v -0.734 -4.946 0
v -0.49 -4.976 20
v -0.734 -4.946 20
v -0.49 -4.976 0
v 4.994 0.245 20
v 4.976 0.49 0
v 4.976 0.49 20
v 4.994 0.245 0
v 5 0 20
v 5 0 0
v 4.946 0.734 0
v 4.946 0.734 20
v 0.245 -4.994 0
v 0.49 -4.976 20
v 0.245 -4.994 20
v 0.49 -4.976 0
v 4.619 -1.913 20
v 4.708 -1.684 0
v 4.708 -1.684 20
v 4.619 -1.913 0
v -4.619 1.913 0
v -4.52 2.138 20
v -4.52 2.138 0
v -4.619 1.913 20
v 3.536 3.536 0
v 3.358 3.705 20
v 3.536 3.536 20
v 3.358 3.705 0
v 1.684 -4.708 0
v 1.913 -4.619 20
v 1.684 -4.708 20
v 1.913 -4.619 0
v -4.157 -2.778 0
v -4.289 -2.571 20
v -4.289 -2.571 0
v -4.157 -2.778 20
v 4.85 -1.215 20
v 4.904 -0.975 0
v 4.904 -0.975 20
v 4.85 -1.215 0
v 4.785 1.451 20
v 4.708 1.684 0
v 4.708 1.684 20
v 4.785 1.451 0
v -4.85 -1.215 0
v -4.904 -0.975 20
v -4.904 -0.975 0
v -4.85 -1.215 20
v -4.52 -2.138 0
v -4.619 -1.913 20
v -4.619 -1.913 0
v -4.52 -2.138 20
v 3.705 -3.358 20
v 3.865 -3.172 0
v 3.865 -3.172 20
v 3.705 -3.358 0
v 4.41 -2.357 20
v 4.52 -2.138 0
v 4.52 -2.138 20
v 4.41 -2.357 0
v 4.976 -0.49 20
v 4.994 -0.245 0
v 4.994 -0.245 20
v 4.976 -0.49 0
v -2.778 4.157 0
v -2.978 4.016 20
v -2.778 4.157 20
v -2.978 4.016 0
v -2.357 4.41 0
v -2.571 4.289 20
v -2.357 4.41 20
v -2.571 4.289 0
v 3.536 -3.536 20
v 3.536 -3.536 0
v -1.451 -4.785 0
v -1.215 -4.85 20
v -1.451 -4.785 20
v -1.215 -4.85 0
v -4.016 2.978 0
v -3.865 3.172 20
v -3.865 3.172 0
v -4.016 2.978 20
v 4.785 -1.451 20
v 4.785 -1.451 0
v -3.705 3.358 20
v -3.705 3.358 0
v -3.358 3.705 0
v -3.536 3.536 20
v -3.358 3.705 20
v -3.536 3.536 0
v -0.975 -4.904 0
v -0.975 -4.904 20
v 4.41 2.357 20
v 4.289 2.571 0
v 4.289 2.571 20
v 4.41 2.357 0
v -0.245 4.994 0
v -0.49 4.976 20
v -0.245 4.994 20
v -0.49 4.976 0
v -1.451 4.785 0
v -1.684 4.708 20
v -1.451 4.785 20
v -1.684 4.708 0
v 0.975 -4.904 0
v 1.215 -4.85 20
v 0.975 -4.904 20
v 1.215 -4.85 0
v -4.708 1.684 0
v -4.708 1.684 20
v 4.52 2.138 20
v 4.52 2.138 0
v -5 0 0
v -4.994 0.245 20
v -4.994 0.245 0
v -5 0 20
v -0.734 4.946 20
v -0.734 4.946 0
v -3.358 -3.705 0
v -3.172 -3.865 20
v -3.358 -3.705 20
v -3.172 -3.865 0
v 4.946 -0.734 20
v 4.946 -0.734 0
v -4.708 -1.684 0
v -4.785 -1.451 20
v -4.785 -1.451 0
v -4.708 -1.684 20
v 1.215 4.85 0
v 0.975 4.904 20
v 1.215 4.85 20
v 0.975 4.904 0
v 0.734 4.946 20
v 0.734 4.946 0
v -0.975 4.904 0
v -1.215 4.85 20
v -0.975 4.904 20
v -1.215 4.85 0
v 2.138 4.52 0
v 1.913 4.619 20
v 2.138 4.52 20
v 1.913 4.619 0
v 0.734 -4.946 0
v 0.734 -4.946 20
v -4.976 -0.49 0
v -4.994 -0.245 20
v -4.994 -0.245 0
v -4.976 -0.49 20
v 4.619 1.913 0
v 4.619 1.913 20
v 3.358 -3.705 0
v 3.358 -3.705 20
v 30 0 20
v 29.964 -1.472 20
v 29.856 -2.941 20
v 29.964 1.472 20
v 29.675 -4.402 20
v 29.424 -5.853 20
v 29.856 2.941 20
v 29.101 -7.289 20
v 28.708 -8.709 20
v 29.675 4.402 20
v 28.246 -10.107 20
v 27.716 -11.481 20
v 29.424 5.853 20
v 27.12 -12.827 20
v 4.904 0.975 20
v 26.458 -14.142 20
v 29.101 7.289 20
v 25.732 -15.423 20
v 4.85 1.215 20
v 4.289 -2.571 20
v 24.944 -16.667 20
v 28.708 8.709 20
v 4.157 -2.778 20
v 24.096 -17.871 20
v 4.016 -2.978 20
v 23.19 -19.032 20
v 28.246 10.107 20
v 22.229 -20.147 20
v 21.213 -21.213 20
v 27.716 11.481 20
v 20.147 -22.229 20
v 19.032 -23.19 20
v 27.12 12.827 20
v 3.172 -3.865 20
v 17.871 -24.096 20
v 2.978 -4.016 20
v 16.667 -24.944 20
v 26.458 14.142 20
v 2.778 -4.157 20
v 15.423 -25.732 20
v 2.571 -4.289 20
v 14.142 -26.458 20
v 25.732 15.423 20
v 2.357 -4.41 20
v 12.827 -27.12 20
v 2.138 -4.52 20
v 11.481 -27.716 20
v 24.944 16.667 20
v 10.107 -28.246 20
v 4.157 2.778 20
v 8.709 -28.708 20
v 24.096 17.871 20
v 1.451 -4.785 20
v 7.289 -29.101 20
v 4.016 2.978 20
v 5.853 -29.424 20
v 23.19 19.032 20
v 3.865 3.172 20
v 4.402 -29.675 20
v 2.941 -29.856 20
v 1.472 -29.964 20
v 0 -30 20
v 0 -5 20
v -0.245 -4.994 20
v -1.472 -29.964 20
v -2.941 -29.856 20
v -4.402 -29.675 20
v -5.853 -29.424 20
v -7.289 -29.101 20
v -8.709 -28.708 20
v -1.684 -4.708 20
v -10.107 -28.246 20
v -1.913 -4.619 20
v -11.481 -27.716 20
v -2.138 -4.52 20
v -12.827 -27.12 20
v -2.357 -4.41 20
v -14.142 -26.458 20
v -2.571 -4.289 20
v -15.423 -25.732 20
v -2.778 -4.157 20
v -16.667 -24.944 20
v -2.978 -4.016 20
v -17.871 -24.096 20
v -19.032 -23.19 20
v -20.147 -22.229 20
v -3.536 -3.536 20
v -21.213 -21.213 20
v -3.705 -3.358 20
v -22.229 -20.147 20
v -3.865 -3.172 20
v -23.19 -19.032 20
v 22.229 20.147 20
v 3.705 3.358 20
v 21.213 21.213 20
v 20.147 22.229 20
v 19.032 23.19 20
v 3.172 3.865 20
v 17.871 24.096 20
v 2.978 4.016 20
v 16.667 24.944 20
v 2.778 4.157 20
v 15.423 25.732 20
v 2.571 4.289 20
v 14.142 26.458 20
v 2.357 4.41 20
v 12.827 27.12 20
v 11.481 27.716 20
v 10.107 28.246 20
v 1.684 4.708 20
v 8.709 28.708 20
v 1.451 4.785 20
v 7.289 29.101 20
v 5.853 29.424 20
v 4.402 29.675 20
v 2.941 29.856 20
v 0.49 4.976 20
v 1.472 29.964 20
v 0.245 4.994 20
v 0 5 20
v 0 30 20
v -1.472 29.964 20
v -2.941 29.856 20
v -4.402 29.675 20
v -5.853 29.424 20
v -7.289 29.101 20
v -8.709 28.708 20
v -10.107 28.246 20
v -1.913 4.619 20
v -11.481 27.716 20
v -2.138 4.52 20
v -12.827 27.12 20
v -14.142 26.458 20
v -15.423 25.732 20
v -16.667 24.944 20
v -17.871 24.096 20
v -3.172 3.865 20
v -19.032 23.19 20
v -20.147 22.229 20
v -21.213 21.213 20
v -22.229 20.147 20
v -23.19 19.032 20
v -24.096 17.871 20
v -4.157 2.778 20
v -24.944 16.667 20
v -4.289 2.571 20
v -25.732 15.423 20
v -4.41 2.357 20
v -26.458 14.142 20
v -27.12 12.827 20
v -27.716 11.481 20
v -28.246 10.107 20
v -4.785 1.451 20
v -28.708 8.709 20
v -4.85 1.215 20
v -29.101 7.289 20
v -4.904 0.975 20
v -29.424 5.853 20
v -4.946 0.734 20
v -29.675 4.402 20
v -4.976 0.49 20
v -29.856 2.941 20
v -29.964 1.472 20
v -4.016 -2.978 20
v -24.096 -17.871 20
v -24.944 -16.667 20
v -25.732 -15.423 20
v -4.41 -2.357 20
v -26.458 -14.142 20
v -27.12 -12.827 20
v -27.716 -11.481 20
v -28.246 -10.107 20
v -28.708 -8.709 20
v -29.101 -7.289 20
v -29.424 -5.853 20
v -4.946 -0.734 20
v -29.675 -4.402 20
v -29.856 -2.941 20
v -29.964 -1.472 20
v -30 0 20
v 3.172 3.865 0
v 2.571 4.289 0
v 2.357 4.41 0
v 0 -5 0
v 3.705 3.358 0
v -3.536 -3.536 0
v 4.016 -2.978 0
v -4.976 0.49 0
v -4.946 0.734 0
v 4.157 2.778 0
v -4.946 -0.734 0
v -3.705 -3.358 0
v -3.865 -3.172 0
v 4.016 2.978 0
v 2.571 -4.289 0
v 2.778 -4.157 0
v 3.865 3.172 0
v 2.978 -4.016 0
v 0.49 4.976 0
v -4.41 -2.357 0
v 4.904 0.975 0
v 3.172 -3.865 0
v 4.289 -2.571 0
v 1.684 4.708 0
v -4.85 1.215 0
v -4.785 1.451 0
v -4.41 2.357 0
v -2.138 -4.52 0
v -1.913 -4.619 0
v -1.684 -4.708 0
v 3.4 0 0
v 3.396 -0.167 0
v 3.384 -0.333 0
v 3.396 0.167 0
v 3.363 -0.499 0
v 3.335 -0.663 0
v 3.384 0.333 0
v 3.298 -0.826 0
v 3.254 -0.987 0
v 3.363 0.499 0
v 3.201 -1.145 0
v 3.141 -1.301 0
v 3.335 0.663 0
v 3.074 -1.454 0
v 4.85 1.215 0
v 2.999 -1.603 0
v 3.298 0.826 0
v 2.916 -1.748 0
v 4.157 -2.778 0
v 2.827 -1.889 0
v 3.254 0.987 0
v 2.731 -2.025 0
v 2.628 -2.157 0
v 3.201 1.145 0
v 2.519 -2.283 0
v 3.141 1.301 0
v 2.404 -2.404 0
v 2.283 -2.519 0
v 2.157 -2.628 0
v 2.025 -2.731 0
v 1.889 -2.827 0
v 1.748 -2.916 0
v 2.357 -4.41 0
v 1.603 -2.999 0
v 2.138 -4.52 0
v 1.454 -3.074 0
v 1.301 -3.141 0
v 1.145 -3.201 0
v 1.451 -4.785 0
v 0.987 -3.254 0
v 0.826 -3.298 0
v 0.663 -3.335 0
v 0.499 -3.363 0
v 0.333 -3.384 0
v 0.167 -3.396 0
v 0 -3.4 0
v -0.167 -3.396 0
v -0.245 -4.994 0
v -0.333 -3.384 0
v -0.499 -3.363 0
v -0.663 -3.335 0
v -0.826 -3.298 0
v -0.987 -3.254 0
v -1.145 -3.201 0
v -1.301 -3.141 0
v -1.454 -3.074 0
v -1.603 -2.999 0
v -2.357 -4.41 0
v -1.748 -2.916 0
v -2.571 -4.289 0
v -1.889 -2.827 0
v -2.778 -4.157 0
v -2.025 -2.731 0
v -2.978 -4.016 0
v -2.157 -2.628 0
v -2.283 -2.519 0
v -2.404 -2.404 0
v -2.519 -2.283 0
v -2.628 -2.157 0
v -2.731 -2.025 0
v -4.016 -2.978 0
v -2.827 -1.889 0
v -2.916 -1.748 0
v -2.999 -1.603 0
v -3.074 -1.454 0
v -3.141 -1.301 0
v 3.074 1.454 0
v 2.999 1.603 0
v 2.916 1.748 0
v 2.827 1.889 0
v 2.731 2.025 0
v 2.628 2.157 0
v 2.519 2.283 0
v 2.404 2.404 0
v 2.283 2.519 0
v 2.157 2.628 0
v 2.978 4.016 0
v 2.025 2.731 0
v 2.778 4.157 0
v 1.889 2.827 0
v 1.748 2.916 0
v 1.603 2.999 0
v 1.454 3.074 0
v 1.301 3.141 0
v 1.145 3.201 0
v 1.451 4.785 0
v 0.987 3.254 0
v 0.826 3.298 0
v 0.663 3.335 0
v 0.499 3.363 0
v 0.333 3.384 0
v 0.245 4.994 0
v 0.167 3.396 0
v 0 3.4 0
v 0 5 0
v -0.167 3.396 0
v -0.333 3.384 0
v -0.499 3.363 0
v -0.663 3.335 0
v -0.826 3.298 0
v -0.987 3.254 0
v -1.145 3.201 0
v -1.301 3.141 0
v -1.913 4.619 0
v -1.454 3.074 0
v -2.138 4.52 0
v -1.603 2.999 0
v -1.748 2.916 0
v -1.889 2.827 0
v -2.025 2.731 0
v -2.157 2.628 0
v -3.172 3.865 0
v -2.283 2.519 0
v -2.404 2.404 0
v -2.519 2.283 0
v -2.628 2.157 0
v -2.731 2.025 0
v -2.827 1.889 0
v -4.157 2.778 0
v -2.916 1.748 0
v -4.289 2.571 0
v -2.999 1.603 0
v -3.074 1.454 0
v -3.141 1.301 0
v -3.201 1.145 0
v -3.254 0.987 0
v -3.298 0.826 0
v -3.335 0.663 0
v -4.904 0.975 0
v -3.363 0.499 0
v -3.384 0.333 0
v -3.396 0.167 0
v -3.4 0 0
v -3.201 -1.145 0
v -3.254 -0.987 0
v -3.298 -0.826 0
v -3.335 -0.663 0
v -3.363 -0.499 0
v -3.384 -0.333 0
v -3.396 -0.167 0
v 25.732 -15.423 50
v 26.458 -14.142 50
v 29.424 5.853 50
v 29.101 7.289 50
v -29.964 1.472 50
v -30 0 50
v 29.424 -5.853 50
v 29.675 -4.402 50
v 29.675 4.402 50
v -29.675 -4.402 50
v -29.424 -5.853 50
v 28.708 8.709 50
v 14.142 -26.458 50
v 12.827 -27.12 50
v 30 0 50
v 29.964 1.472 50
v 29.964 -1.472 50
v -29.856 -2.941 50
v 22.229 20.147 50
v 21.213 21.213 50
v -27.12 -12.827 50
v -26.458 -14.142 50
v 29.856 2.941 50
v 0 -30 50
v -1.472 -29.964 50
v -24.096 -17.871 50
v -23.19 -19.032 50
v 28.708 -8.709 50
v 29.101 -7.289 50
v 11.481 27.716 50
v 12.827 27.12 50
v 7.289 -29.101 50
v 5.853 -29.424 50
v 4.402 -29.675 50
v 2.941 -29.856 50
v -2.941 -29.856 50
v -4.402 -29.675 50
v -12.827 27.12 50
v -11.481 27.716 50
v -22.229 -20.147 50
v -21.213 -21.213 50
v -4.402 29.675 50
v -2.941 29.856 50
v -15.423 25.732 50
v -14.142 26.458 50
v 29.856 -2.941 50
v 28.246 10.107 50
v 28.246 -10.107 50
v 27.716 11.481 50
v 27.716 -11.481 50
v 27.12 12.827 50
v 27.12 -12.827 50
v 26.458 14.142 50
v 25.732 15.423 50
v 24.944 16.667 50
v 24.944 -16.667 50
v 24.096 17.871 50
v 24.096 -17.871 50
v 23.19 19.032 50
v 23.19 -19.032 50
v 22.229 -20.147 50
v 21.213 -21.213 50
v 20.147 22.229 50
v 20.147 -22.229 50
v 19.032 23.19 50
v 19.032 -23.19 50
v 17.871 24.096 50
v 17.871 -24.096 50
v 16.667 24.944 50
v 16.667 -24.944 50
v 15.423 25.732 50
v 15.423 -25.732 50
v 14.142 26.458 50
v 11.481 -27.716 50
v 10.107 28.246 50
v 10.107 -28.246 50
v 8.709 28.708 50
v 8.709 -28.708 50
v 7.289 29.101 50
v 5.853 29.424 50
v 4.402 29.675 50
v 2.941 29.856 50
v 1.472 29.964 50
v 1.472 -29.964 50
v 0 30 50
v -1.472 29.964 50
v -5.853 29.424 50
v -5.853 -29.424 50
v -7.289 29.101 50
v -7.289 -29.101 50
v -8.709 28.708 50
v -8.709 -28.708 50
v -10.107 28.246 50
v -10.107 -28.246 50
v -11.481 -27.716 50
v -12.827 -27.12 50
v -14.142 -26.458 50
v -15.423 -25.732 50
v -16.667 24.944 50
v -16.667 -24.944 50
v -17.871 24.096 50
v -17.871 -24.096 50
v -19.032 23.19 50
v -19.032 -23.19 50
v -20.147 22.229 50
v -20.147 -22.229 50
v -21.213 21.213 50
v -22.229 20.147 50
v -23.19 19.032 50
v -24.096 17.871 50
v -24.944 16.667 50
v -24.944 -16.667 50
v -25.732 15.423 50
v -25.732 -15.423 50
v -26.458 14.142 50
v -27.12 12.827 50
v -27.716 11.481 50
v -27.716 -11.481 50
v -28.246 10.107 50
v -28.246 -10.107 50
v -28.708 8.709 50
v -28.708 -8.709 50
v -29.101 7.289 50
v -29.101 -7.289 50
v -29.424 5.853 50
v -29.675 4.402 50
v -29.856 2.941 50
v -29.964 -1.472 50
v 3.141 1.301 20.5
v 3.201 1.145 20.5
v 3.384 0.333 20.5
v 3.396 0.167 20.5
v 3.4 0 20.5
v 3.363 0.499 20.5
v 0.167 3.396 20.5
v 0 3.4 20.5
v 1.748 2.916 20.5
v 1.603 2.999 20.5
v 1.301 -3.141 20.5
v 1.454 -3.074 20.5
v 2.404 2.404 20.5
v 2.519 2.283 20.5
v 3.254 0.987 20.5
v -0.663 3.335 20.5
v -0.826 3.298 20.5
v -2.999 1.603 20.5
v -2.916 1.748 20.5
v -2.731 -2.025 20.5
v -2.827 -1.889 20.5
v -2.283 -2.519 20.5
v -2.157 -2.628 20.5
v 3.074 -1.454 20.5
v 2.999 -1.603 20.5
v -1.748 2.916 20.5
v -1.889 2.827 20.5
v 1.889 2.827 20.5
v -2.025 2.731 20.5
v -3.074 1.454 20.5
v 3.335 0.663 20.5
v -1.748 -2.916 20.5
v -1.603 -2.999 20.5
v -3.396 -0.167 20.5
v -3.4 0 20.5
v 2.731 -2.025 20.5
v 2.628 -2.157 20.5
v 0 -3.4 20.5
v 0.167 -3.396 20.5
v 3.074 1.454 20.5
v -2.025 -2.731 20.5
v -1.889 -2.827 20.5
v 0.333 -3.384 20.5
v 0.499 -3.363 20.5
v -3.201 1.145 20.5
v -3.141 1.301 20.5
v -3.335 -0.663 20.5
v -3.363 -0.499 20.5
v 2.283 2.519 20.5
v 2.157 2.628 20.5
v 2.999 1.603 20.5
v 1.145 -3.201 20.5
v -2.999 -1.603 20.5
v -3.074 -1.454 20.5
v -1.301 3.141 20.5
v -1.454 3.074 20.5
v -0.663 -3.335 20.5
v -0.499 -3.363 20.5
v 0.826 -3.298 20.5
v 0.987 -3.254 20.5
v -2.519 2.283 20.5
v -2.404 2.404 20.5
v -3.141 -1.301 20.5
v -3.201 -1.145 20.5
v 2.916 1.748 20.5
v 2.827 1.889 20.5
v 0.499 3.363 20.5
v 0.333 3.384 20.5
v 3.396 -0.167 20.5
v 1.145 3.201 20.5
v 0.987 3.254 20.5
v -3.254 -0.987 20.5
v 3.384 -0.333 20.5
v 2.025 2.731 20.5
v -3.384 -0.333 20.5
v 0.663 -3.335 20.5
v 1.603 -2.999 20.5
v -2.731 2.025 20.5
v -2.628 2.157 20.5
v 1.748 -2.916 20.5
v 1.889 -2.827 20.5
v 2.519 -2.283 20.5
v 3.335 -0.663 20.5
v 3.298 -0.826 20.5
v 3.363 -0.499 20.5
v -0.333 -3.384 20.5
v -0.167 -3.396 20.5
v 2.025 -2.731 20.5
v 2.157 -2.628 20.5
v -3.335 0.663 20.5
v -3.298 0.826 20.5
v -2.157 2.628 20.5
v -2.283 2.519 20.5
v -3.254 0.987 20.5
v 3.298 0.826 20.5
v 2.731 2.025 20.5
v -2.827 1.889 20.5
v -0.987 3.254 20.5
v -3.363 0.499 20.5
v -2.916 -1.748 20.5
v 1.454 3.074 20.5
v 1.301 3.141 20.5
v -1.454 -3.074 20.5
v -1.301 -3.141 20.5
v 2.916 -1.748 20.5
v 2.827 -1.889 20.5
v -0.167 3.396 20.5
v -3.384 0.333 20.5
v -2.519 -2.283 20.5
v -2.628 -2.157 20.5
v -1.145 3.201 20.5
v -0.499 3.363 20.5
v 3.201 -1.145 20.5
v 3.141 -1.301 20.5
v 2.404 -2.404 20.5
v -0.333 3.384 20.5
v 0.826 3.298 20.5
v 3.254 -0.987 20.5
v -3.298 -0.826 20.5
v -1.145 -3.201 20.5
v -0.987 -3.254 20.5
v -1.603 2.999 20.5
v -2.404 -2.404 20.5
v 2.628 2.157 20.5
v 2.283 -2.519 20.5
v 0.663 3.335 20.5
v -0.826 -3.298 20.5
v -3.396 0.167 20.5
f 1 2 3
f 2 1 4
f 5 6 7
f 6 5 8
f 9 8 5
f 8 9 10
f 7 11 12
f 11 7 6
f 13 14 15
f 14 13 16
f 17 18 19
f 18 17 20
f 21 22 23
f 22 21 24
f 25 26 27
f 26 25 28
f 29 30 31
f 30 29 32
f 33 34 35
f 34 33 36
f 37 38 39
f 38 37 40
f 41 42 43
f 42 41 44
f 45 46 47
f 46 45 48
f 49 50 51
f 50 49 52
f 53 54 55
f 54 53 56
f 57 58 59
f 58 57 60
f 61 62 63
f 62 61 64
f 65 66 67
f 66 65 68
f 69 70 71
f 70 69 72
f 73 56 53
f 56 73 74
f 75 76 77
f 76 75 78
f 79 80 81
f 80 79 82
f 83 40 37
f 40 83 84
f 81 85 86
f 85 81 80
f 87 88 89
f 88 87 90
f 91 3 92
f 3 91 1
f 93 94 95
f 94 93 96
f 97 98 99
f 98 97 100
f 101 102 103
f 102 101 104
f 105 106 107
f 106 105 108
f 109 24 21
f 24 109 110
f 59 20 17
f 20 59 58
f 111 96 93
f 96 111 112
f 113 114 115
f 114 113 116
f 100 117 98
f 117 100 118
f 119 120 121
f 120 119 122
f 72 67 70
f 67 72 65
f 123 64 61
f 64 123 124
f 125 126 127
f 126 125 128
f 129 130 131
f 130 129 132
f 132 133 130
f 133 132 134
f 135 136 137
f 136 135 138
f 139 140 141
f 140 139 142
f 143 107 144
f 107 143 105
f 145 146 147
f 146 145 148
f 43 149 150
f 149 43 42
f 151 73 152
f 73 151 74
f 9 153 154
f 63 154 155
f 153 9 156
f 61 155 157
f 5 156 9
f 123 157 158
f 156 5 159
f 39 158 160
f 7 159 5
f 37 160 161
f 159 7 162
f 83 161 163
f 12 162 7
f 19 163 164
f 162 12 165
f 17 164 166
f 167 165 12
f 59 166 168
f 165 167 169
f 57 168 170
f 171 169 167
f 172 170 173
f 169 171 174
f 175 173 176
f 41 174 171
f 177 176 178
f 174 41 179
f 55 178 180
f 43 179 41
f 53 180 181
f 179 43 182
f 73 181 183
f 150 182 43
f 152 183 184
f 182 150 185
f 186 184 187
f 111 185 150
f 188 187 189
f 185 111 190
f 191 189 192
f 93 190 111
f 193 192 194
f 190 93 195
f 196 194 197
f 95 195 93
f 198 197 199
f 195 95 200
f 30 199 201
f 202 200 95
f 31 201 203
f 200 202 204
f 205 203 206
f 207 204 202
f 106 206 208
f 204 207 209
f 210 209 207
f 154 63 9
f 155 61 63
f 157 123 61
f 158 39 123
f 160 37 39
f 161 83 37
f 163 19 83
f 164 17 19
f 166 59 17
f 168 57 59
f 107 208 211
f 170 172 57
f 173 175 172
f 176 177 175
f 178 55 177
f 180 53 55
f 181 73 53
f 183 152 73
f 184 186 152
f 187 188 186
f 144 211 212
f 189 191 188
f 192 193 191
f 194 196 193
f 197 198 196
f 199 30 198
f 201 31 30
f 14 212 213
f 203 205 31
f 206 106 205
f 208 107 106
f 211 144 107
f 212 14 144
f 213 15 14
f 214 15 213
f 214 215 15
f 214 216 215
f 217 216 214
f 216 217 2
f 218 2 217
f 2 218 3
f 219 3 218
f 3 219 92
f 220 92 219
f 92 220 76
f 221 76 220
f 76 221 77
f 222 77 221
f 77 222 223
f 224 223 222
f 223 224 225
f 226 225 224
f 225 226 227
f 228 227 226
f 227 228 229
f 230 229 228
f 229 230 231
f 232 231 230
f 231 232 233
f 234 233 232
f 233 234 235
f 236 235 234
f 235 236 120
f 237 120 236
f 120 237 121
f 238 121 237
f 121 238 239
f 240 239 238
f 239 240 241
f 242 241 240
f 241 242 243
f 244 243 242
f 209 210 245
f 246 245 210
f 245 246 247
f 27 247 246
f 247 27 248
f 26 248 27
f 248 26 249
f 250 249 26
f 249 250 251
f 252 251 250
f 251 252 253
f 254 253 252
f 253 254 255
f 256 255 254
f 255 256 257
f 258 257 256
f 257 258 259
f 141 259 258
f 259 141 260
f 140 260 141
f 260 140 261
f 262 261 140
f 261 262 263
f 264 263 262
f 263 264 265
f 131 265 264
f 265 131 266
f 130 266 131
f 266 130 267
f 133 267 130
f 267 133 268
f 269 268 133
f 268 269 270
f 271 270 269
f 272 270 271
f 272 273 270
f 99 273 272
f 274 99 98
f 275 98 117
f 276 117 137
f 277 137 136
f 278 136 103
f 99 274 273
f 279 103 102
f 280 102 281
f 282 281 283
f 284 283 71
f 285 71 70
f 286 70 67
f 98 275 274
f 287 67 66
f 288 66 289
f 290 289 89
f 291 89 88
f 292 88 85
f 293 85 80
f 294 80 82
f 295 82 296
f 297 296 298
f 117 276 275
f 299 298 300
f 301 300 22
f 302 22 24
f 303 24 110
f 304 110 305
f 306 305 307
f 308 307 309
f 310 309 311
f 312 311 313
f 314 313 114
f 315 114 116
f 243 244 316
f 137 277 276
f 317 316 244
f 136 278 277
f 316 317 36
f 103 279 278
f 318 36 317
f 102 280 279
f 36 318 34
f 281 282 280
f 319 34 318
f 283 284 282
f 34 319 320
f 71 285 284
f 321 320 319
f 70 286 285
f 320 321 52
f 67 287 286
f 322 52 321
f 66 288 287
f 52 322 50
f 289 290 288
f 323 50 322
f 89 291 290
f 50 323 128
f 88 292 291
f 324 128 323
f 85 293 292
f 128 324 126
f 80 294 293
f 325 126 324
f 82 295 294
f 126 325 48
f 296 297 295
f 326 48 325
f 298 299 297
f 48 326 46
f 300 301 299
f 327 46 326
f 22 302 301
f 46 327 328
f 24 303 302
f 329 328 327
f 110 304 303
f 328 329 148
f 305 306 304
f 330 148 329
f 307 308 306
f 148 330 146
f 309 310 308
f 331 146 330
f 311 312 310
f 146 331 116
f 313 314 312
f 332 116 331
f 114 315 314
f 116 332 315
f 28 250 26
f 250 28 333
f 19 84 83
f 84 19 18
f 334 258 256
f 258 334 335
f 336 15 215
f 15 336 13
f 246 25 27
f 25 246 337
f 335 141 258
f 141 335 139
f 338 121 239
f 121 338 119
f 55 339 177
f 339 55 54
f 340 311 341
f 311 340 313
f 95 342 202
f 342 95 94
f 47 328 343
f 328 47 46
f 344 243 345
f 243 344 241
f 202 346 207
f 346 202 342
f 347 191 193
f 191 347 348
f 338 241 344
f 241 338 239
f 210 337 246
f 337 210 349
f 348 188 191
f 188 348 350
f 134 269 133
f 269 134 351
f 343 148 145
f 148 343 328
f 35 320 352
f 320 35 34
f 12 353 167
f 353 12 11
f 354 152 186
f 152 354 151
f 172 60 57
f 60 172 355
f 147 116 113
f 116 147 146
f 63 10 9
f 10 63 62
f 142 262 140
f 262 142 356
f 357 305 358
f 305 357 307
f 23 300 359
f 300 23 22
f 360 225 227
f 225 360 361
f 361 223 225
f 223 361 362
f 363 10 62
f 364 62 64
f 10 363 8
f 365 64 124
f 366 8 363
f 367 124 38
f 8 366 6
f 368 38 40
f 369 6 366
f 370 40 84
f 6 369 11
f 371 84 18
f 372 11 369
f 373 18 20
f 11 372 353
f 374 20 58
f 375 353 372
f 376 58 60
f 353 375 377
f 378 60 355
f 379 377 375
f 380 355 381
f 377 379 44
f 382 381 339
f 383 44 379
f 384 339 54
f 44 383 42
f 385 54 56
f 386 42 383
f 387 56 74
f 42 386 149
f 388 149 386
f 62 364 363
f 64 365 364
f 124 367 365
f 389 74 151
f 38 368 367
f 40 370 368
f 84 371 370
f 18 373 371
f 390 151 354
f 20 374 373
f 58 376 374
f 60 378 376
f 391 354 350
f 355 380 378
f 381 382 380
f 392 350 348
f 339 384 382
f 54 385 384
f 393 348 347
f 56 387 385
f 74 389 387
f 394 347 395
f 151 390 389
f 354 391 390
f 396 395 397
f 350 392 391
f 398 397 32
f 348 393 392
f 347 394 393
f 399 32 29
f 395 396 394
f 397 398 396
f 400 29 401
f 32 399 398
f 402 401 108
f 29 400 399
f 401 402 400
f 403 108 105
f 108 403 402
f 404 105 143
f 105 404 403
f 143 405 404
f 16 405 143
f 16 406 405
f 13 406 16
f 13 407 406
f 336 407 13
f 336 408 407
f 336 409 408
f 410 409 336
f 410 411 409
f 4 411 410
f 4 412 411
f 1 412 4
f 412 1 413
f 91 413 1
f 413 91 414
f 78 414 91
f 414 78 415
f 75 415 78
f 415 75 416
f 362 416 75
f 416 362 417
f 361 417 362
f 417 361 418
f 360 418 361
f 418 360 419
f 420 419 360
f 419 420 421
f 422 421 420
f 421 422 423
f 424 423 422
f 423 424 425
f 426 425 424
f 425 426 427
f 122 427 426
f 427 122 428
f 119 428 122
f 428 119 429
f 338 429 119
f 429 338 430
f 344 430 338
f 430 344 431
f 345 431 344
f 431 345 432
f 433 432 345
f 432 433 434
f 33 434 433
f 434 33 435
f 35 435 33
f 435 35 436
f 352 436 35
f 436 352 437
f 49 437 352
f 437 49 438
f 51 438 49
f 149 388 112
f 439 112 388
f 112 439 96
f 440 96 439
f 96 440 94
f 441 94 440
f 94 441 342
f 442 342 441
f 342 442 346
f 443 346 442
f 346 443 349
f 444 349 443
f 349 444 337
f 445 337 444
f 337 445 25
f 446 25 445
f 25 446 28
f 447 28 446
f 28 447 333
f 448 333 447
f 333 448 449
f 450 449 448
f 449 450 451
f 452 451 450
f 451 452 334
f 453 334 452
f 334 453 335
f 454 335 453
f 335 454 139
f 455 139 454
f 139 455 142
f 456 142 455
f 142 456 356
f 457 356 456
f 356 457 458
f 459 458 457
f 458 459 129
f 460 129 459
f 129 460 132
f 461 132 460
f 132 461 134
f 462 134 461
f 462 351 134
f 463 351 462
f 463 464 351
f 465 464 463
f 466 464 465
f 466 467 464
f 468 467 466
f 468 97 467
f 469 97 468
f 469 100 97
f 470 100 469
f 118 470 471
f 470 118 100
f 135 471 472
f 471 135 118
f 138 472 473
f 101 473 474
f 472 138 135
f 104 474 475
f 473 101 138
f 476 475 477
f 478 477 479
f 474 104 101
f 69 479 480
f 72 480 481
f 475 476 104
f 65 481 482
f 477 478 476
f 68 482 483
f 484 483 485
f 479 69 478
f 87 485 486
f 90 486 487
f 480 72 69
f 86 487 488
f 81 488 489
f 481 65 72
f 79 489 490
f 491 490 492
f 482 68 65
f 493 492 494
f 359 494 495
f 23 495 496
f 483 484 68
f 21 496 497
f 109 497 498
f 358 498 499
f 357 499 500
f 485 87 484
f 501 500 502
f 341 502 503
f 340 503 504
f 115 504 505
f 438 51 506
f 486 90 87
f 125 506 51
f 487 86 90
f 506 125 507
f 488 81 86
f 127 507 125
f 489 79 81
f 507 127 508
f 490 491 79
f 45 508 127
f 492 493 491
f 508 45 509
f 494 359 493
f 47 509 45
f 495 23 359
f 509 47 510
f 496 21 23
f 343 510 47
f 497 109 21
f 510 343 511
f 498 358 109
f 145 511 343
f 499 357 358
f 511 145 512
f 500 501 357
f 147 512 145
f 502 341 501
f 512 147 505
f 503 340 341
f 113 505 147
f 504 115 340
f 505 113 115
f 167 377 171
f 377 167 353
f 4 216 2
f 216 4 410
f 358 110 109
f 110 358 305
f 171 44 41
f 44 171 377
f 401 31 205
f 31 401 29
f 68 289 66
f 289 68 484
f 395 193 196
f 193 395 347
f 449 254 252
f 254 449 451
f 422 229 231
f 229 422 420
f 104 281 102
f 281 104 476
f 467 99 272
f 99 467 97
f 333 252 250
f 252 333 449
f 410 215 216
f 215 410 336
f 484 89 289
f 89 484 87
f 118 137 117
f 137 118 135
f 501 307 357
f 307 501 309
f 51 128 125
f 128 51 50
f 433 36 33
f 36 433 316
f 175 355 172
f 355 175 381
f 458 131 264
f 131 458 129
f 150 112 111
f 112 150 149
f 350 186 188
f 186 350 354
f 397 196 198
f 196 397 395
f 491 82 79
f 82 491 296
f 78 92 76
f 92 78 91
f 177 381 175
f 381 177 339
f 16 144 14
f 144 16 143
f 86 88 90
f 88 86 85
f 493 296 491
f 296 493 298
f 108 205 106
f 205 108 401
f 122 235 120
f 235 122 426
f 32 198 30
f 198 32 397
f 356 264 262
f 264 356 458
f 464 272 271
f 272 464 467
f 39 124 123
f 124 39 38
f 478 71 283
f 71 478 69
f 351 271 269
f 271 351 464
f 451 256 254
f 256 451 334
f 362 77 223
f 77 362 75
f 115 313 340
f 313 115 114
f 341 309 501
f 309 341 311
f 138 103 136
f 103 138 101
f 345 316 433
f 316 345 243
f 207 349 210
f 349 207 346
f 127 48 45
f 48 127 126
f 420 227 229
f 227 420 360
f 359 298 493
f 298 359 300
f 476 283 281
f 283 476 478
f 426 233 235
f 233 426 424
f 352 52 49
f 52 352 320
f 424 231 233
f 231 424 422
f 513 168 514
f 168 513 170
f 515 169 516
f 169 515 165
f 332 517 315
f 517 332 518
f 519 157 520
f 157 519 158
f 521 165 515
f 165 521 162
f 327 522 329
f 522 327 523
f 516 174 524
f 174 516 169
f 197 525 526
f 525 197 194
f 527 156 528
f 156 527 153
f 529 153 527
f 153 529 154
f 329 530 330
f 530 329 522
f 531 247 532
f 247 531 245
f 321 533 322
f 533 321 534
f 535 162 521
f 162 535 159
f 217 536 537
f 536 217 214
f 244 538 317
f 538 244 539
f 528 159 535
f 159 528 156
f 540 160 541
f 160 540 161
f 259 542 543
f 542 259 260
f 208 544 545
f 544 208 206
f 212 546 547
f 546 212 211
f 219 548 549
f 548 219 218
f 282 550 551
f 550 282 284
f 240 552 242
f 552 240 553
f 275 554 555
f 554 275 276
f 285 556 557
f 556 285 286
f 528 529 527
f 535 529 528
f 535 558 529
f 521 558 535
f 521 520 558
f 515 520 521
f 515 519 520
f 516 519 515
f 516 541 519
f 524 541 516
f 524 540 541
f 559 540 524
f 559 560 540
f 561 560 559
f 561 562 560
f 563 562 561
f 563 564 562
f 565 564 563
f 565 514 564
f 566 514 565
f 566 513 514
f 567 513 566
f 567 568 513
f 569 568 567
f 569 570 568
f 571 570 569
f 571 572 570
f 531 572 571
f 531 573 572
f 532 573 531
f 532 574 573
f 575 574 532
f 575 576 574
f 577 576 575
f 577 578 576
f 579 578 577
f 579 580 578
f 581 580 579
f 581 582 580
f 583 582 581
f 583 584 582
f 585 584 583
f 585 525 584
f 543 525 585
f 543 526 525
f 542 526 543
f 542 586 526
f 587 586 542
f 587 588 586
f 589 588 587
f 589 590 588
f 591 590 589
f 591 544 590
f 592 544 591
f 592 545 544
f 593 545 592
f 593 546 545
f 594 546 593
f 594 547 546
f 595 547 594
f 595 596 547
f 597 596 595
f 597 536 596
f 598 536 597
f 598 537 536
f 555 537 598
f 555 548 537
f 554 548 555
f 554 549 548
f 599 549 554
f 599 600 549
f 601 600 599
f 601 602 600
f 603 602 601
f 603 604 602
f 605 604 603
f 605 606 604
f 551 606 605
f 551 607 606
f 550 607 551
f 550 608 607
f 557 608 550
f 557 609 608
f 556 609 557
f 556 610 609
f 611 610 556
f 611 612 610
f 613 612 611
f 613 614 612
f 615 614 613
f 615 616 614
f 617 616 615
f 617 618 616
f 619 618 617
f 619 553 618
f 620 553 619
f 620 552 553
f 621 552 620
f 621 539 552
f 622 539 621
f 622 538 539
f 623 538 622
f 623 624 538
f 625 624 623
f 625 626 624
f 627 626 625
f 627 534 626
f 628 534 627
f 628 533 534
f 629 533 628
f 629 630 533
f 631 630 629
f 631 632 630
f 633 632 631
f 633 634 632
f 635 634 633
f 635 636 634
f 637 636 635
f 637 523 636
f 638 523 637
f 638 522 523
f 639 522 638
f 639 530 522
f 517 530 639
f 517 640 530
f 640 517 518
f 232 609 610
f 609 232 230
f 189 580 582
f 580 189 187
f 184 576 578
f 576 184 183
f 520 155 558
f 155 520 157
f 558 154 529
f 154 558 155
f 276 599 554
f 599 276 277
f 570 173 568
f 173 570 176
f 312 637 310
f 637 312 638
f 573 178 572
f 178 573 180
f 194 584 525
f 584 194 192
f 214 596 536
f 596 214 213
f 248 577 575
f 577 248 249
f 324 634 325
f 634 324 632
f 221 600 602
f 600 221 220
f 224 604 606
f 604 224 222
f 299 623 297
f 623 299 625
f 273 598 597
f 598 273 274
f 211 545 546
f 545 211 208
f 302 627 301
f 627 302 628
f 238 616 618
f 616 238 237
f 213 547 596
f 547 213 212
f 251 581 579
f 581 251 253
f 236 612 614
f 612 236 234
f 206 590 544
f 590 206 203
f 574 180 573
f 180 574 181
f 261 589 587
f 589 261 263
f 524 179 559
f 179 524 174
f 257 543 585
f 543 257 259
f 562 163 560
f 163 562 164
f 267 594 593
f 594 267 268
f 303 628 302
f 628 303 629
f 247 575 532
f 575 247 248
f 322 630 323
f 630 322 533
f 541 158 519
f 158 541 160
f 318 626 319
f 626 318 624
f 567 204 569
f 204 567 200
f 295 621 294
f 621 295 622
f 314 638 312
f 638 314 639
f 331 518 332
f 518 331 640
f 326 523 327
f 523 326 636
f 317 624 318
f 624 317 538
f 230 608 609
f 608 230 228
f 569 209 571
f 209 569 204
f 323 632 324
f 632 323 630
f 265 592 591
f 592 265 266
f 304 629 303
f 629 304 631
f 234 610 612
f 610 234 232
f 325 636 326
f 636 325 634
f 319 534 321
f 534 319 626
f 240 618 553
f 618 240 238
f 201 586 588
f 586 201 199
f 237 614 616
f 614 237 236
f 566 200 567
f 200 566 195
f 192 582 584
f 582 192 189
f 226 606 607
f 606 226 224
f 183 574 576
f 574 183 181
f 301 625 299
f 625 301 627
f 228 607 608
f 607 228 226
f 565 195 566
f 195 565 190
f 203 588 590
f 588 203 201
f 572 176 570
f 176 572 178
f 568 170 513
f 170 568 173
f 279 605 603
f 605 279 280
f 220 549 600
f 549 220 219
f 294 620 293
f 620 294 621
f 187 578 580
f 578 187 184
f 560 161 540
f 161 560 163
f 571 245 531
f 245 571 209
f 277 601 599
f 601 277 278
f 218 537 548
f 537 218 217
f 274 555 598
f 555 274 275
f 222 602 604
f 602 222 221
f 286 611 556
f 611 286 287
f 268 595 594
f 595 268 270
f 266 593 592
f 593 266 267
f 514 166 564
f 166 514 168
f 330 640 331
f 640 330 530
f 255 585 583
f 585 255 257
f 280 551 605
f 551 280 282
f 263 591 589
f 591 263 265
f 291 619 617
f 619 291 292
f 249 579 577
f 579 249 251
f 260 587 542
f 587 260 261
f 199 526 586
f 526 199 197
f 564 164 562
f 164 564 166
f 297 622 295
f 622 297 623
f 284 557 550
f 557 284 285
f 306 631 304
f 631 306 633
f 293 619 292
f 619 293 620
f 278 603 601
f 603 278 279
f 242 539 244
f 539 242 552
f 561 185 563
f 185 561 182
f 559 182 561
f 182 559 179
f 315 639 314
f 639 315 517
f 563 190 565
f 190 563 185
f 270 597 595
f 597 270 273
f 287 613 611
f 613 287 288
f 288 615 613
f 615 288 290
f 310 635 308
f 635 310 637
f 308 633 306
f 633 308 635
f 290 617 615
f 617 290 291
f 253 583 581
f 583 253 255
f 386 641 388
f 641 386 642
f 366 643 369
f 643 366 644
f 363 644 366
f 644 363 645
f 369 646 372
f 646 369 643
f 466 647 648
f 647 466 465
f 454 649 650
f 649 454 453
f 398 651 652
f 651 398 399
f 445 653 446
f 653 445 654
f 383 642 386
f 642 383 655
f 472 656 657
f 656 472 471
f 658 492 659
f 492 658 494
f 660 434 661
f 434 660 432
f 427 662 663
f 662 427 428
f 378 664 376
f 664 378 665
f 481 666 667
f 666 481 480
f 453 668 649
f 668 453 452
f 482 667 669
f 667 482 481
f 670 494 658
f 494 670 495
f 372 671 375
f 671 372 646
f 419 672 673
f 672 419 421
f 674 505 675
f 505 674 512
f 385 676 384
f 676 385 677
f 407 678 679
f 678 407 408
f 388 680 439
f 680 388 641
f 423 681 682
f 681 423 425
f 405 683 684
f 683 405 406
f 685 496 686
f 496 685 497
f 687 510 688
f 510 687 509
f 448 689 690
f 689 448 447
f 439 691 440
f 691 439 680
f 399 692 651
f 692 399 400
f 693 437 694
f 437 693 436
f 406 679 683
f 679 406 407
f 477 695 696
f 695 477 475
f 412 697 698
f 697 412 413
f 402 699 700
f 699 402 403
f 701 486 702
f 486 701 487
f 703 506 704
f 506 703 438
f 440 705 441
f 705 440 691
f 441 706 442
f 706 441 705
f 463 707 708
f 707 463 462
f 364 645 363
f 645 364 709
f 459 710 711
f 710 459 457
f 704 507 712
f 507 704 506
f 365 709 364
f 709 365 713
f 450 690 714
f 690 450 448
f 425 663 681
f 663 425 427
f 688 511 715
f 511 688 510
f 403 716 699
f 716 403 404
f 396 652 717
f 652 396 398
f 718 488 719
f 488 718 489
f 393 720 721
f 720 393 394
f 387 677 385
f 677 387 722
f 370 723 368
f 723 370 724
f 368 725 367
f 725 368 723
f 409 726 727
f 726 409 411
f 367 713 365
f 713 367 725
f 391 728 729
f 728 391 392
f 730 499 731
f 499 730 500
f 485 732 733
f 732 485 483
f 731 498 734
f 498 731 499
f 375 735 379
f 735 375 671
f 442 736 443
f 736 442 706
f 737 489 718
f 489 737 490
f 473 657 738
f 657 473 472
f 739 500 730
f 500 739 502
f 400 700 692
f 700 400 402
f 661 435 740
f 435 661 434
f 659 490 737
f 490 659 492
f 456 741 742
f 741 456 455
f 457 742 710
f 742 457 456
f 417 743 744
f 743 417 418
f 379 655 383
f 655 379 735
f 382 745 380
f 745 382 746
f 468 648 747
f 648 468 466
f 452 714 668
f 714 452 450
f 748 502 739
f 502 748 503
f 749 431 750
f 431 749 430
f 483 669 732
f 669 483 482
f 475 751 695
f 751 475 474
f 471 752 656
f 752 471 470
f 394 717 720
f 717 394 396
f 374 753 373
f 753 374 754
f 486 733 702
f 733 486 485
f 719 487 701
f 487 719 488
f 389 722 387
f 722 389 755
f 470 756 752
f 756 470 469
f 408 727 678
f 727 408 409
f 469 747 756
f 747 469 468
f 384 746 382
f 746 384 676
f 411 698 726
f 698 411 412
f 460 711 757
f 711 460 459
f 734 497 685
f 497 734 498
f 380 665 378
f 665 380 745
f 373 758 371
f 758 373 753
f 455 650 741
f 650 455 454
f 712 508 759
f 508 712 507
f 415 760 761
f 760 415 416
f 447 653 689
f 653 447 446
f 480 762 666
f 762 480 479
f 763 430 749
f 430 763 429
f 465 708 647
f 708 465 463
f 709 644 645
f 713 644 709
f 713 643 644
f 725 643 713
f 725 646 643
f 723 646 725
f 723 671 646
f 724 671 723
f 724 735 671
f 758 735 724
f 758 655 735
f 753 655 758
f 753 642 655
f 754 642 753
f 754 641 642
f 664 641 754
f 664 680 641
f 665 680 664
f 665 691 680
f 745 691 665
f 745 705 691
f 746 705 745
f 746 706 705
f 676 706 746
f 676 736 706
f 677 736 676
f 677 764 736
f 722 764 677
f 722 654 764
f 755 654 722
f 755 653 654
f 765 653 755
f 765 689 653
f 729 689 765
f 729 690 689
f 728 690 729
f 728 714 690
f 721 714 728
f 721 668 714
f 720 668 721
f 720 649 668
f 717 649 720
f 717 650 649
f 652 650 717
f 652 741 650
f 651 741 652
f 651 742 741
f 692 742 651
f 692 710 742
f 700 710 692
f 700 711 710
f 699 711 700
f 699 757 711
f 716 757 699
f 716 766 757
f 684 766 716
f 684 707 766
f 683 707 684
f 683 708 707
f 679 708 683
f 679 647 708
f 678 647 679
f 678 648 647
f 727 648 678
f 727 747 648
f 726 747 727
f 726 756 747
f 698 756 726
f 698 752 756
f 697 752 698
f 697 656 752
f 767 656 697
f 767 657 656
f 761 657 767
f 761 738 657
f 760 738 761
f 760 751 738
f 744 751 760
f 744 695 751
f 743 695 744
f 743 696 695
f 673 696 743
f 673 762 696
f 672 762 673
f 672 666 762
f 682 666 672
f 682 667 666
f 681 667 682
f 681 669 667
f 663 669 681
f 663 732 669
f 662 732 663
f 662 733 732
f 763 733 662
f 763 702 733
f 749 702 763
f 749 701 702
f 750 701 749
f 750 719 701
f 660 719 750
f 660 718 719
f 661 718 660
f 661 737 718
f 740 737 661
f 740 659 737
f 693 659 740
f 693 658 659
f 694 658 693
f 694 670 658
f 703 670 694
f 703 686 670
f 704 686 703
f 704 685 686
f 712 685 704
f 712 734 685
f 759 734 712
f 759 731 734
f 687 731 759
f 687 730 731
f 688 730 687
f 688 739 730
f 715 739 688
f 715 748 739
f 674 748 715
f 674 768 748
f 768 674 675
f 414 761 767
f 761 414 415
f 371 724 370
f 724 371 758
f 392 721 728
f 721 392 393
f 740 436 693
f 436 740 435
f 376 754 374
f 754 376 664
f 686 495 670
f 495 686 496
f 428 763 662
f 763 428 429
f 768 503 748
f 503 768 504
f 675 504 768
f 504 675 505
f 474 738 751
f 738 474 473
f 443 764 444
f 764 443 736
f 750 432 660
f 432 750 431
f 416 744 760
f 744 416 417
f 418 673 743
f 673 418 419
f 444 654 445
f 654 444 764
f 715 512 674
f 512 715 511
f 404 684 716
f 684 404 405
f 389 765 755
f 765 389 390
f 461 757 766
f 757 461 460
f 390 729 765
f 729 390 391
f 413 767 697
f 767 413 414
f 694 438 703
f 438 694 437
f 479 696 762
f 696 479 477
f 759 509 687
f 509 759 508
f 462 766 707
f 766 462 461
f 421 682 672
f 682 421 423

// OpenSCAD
// Small lab funnel - printed upright, open top and bottom
// Units: mm. One complete part, no external libraries.

// ---- Parameters ----
spout_od      = 10;    // spout outer diameter
spout_length  = 20;    // spout runs from z = 0 to z = 20
cone_base_d   = 60;    // cone rim (base) outer diameter at z = 50
cone_top_d    = 10;    // cone outer diameter where it meets the spout (z = 20)
cone_height   = 30;    // cone runs from z = 20 to z = 50 (50 - 20)
wall          = 1.6;   // uniform wall thickness for spout and cone
eps           = 0.5;   // cutter overshoot past faces

$fn = 128;             // smoothness of curved surfaces

// ---- Derived ----
spout_id = spout_od - 2 * wall;   // spout bore diameter (6.8 mm)

// ---- Model ----
difference() {
    union() {
        // Spout: straight tube from z = 0 to z = 20
        cylinder(d = spout_od, h = spout_length);

        // Cone: widens from z = 20 to z = 50
        translate([0, 0, spout_length])
            linear_extrude(height = cone_height)
                circle(d = cone_base_d);
    }

    // Through-bore: spout bore extended into the cone along the same axis
    translate([0, 0, -eps])
        cylinder(d = spout_id, h = spout_length + 2 * eps);
}
